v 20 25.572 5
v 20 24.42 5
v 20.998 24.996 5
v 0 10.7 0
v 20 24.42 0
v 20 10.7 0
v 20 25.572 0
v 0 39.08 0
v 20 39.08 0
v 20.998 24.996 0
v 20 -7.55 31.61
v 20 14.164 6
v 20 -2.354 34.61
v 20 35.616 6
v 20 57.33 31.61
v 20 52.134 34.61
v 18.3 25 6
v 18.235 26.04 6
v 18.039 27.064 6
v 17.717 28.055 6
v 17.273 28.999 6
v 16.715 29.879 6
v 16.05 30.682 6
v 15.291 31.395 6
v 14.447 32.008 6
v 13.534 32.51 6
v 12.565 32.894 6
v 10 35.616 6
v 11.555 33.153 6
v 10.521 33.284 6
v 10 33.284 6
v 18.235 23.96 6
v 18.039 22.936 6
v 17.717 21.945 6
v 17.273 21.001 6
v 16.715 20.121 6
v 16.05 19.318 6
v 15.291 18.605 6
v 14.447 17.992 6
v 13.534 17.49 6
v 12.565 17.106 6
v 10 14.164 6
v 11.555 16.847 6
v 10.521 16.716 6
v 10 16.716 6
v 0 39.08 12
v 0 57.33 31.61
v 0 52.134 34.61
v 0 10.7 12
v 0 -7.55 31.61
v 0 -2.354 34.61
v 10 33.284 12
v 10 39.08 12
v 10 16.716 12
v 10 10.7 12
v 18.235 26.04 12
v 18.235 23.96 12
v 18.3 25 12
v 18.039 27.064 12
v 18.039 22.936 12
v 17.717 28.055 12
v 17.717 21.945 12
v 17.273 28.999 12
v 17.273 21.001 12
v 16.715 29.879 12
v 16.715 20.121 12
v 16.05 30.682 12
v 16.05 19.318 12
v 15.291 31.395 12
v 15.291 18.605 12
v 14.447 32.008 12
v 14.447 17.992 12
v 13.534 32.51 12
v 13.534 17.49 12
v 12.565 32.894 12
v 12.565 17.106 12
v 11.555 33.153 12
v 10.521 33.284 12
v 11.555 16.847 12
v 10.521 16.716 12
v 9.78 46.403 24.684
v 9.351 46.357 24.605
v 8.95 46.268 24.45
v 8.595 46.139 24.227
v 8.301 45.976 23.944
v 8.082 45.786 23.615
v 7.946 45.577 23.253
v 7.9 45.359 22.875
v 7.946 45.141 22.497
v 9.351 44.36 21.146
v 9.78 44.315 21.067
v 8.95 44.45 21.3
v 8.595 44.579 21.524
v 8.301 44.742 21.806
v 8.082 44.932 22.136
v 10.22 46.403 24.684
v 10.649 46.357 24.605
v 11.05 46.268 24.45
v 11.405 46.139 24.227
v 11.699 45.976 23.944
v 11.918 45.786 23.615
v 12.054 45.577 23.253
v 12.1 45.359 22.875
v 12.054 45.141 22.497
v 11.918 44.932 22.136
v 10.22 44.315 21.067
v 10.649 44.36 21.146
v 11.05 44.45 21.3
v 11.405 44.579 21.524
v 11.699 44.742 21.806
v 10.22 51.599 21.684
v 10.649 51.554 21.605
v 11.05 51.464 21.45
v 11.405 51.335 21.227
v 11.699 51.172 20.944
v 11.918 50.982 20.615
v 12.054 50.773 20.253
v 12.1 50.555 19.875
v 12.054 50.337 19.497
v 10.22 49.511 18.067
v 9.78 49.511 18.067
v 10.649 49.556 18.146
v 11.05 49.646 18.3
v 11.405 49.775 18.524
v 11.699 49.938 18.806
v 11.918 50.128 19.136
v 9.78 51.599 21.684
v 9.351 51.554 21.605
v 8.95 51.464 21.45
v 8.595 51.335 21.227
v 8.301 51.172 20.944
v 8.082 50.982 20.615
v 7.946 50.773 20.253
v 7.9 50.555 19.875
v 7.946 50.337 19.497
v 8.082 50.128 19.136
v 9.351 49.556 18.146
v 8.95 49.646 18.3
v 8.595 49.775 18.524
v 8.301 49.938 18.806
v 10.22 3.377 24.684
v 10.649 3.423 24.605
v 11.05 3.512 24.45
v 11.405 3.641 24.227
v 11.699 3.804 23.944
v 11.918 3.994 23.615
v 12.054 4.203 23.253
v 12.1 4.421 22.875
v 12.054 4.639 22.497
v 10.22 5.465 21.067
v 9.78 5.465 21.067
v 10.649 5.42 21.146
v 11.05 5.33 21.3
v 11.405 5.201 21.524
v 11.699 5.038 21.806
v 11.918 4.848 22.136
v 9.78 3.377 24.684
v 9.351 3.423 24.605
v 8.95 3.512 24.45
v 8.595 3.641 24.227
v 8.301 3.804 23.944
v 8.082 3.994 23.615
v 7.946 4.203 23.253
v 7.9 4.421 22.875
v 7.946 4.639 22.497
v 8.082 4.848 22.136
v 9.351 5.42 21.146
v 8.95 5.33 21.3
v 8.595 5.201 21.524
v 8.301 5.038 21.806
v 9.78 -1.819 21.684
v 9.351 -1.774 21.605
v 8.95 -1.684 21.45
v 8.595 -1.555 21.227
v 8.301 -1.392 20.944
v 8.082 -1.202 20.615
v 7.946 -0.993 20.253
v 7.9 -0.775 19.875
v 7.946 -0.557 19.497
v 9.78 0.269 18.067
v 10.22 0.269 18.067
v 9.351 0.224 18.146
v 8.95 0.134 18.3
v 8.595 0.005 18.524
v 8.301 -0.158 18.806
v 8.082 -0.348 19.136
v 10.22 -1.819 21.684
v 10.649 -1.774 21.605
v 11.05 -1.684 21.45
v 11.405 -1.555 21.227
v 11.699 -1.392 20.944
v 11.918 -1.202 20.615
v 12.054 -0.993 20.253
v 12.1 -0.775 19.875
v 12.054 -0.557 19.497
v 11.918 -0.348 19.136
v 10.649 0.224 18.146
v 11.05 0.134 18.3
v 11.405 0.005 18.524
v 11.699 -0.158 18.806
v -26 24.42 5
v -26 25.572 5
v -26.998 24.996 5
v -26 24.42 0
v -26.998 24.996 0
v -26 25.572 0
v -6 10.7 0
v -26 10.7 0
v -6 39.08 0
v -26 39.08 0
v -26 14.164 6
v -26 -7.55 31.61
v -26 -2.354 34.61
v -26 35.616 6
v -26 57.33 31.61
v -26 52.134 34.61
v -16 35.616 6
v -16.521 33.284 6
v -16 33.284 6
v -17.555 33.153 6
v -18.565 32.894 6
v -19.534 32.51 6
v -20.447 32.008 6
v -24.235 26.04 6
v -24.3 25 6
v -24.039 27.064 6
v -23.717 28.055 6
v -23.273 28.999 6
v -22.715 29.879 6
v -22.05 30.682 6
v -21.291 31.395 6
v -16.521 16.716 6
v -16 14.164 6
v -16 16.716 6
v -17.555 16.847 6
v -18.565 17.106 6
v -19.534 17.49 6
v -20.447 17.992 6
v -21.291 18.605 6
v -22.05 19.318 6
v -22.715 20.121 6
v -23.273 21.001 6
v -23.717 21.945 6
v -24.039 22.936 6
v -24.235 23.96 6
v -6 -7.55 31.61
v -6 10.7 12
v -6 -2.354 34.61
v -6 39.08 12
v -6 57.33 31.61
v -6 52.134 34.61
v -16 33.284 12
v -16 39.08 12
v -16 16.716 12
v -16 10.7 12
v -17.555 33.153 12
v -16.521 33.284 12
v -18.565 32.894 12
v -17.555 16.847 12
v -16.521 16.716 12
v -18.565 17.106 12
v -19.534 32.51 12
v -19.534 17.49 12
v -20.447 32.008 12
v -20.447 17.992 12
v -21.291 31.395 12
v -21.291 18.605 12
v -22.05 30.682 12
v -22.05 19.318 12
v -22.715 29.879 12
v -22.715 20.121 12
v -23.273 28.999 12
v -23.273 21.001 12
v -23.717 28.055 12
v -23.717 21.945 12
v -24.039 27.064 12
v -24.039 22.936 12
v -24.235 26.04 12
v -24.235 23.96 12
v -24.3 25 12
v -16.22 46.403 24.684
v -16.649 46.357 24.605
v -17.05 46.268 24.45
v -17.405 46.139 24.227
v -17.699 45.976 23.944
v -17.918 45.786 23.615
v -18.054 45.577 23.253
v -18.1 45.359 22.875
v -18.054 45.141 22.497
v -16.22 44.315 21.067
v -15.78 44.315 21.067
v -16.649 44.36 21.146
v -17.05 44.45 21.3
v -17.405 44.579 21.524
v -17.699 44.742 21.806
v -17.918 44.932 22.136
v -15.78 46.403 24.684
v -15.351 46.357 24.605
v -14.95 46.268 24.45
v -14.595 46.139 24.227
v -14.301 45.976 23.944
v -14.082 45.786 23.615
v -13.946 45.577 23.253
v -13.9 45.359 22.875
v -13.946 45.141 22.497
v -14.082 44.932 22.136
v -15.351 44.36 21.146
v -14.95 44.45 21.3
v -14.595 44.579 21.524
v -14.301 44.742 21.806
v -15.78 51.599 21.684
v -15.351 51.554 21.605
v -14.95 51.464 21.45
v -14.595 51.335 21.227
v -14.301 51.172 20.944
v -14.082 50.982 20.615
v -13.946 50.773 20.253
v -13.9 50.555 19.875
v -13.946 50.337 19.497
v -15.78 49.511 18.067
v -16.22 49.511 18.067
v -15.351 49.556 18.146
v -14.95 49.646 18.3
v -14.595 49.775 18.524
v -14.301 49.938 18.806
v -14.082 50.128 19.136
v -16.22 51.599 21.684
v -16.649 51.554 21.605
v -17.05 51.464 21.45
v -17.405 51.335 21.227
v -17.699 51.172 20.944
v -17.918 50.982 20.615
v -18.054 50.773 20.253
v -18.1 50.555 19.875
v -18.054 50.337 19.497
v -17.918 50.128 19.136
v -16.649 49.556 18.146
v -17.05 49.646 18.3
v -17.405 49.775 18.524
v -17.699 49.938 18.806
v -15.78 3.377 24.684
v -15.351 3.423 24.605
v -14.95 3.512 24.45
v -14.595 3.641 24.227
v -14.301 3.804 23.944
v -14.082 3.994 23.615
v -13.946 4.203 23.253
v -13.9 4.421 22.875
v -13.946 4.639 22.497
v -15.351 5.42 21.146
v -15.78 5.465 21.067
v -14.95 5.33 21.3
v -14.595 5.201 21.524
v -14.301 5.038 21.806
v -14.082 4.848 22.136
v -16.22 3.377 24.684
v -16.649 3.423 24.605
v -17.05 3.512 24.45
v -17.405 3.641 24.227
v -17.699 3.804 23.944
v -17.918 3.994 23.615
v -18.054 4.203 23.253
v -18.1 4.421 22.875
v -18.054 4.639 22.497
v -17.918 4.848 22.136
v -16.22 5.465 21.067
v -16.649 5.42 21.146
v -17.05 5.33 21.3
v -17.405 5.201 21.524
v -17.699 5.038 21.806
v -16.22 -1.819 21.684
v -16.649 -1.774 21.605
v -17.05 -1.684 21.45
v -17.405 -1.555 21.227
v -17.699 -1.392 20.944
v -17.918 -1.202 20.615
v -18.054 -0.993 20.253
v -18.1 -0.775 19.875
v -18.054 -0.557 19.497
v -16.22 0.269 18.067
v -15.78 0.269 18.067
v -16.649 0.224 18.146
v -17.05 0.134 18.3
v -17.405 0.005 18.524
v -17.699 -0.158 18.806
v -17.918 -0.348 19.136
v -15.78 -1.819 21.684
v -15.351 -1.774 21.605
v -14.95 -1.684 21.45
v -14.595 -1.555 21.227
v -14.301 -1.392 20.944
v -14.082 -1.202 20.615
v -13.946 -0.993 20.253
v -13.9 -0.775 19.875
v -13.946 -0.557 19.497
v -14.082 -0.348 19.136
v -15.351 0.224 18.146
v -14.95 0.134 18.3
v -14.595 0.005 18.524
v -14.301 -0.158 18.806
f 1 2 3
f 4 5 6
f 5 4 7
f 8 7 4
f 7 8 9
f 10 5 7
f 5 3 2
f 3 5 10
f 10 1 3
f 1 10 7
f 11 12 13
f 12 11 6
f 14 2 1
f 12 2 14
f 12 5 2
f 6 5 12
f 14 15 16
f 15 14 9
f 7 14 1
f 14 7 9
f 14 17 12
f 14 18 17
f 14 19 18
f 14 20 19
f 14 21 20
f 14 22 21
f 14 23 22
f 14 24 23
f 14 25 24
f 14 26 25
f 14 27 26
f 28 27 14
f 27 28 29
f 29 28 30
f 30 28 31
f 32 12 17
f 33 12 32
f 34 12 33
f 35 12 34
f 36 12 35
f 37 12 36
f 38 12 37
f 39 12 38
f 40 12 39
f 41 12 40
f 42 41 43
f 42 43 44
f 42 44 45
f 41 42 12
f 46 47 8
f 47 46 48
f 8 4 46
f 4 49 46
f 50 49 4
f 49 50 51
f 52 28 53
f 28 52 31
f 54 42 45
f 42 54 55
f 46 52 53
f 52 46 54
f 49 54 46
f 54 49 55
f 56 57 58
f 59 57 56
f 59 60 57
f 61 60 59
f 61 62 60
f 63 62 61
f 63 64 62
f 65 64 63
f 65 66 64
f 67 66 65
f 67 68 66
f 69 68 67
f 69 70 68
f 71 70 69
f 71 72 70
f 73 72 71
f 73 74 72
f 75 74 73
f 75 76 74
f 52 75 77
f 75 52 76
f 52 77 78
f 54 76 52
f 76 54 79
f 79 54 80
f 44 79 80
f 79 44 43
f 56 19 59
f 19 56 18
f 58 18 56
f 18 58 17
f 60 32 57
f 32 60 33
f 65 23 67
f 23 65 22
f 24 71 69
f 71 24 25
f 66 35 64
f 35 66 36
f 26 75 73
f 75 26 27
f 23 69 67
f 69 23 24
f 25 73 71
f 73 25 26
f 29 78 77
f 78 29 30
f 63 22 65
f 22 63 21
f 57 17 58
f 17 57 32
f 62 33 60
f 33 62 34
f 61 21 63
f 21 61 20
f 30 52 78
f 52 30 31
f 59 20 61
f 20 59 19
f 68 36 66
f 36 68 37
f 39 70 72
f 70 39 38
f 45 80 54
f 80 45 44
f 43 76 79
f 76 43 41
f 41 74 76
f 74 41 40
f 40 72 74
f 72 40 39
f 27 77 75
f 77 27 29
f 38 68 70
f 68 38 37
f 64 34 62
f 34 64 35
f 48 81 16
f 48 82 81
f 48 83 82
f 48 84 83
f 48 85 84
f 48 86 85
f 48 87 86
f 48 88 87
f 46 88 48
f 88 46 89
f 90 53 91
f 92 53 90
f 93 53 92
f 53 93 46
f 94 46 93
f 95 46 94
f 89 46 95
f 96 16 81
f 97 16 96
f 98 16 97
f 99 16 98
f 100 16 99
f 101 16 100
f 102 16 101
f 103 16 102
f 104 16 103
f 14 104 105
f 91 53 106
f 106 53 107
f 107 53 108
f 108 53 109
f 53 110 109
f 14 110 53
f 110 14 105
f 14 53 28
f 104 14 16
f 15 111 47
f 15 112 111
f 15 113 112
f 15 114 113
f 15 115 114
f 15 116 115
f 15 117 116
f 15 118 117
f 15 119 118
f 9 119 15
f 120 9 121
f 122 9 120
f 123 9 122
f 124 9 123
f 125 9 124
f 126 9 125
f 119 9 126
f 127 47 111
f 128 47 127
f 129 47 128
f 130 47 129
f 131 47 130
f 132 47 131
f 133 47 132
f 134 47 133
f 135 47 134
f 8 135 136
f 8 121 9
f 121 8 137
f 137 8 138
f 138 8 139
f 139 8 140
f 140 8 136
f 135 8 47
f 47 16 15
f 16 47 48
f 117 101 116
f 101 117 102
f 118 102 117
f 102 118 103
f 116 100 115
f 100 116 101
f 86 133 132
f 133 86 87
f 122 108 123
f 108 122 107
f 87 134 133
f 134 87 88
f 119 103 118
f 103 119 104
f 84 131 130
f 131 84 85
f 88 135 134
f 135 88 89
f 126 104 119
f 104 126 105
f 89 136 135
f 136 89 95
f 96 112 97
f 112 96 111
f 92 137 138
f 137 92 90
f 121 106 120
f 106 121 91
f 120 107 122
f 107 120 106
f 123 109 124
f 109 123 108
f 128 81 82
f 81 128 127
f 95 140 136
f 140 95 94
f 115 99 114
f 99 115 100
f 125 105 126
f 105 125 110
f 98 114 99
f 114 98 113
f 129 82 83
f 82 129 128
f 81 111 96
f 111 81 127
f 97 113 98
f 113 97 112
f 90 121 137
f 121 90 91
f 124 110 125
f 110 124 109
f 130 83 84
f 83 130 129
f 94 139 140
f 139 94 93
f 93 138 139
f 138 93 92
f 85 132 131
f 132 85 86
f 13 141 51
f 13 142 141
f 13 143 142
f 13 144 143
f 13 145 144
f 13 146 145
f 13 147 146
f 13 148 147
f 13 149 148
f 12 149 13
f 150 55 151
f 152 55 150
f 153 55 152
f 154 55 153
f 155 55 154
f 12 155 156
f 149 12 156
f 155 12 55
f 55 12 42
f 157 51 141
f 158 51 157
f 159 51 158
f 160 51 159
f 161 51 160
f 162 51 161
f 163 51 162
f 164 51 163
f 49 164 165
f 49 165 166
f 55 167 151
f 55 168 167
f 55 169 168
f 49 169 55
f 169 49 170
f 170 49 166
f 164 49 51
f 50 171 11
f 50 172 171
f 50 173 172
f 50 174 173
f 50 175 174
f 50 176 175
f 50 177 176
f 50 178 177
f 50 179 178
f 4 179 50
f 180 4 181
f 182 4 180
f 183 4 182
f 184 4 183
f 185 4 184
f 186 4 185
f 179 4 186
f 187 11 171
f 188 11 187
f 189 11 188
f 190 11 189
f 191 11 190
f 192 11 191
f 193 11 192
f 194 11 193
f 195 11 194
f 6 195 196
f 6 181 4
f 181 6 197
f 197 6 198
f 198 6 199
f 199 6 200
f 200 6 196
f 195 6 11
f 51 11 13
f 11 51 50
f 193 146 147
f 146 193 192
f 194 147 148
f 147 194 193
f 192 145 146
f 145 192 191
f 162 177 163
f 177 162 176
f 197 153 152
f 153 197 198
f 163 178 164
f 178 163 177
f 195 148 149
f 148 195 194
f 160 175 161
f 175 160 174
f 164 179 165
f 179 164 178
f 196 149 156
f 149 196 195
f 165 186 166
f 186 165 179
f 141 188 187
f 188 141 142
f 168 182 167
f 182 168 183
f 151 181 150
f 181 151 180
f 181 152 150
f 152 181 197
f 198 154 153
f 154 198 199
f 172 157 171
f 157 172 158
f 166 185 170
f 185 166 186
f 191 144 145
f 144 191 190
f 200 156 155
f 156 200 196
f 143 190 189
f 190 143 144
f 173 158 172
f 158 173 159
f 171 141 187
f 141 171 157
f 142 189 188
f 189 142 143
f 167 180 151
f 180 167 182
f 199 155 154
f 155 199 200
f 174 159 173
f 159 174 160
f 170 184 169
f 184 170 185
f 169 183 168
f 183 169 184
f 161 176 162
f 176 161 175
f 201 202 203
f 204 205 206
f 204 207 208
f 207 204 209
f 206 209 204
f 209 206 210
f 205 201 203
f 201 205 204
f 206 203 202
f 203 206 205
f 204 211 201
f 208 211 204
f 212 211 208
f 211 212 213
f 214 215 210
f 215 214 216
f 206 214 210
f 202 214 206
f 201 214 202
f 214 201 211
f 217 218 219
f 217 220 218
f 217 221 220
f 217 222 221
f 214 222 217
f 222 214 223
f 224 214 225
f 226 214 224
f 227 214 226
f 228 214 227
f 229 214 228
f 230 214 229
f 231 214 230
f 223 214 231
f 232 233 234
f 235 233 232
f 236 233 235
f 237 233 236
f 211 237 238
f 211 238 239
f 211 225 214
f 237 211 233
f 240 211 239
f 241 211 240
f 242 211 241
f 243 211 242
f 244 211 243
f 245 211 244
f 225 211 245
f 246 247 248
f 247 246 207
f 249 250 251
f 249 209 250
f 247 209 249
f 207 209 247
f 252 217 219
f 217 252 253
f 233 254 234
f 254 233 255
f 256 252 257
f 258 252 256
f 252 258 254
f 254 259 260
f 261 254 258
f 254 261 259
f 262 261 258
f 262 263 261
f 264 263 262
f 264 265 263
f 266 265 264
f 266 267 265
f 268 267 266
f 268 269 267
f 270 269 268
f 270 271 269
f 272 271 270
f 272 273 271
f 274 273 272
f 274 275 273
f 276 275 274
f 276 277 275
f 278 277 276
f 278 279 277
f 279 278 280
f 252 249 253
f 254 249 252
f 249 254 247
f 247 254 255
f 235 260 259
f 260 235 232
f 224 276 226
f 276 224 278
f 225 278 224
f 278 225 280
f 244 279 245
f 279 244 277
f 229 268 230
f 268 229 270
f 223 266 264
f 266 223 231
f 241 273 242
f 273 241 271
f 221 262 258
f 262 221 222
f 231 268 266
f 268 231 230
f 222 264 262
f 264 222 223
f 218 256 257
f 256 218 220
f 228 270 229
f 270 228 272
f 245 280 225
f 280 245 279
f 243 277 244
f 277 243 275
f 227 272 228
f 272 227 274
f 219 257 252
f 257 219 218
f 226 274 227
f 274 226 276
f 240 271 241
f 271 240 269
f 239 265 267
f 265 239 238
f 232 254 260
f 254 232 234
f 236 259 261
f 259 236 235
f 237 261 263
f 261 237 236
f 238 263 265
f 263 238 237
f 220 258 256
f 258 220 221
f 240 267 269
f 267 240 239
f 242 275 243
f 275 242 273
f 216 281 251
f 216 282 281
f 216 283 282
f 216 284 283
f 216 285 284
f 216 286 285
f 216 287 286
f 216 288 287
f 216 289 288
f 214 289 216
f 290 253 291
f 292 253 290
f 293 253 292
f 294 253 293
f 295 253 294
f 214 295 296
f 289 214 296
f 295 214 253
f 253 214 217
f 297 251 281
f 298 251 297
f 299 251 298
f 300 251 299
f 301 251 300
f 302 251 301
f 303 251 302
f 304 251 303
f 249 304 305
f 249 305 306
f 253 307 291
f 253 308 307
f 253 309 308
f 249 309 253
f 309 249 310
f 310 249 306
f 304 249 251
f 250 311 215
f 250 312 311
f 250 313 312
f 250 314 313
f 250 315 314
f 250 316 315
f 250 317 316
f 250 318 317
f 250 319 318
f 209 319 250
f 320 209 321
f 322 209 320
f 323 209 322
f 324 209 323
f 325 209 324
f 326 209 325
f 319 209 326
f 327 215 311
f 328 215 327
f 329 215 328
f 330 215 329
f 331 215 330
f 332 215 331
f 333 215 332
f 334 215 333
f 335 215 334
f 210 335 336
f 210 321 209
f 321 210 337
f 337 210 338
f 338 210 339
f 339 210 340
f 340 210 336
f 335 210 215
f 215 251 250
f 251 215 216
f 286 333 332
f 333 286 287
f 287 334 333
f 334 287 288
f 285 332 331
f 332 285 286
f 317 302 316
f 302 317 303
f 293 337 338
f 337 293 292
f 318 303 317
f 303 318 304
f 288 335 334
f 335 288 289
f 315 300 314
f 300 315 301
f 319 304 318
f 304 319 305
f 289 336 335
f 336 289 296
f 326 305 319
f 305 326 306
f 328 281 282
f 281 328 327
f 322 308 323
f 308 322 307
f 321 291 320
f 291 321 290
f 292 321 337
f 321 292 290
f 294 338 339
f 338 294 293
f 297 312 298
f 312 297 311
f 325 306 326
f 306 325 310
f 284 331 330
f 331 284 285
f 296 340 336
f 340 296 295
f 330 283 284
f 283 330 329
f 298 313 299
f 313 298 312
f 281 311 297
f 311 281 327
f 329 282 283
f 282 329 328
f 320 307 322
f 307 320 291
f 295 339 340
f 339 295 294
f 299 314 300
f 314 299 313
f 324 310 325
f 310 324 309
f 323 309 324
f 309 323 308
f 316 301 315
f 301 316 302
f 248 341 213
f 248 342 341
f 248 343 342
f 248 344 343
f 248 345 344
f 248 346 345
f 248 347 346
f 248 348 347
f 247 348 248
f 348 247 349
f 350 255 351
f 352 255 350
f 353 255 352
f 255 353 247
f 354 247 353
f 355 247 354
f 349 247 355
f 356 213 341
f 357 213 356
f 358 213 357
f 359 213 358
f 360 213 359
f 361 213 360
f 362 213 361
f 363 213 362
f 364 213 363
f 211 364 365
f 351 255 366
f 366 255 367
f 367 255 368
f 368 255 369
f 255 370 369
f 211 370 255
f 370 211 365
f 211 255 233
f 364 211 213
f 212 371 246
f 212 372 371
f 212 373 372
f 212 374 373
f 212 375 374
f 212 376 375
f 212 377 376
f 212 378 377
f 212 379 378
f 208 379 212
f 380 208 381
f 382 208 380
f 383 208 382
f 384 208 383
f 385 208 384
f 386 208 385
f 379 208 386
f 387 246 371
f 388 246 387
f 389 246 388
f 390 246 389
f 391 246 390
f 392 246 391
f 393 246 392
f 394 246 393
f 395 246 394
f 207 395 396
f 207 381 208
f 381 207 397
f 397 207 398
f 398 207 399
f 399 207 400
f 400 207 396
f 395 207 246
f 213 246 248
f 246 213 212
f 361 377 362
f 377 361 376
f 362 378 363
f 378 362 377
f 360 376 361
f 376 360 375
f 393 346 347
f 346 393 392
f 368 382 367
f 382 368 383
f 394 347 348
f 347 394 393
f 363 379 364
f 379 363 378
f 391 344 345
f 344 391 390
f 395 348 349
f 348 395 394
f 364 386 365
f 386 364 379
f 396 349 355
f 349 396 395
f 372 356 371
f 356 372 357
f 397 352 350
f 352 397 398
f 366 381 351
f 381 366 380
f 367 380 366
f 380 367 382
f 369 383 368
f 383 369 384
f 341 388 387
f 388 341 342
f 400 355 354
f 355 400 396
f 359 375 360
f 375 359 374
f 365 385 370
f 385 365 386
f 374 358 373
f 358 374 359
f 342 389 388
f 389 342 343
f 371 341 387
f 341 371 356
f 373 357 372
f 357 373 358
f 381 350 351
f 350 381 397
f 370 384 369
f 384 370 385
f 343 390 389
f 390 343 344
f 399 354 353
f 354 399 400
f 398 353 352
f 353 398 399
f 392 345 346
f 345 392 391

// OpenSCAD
// file: functions.scad
// PRUSA Mendel  
// Functions used in many files
// GNU GPL v2
// Josef Průša
// josefprusa@me.com
// prusadjs.cz
// http://www.reprap.org/wiki/Prusa_Mendel
// http://github.com/prusajr/PrusaMendel

module nut(d,h,horizontal=true){
cornerdiameter =  (d / 2) / cos (180 / 6);
cylinder(h = h, r = cornerdiameter, $fn = 6);
if(horizontal){
for(i = [1:6]){
	rotate([0,0,60*i]) translate([-cornerdiameter-0.2,0,0]) rotate([0,0,-45]) cube(size = [2,2,h]);
}}
}

// By nophead
module polyhole(d,h) {
    n = max(round(2 * d),3);
    rotate([0,0,180])
        cylinder(h = h, r = (d / 2) / cos (180 / n), $fn = n);
}

module roundcorner(diameter){
	difference(){
		cube(size = [diameter,diameter,99], center = false);
		translate(v = [diameter, diameter, 0]) cylinder(h = 100, r=diameter, center=true);
	}
}
// file: metric.scad
// PRUSA Mendel  
// Default metric sizes
// GNU GPL v2
// Josef Průša
// josefprusa@me.com
// prusadjs.cz
// http://www.reprap.org/wiki/Prusa_Mendel
// http://github.com/prusajr/PrusaMendel

// DONT CHANGE THIS FILE! ALTER VALUES IN CONFIGURATION.SCAD INSTEAD

// RODS

threaded_rod_diameter = 8;
threaded_rod_diameter_horizontal = 8;
smooth_bar_diameter = 8;
smooth_bar_diameter_horizontal = 8;

// Nuts and bolts

m8_diameter = 8;
m8_nut_diameter = 14.5;

m4_diameter = 4;
m4_nut_diameter = 7.5;

m3_diameter = 3;
m3_nut_diameter = 5;

// Bushing holder

bushing_core_diameter = smooth_bar_diameter;
bushing_material_thickness = 1;

// Motors

motor_shaft = 5.1;
// file: configuration.scad
// PRUSA Mendel  
// Configuration file
// GNU GPL v2
// Josef Průša
// josefprusa@me.com
// prusadjs.cz
// http://www.reprap.org/wiki/Prusa_Mendel
// http://github.com/prusajr/PrusaMendel

// PLEASE SELECT ONE OF THE CONFIGURATIONS BELOW
// BY UN-COMMENTING IT

// Uncomment for metric settings
// METRIC METRIC METRIC METRIC METRIC METRIC METRIC METRIC 

include <metric.scad>;

// Uncomment for imperial settings
// IMPERIAL IMPERIAL IMPERIAL IMPERIAL IMPERIAL IMPERIAL IMPERIAL 

//include <sae.scad>;

//thin_wall = 3;
// LM8UU
//linear = false;

// override settings by customizing below
// CUSTOM CUSTOM CUSTOM CUSTOM CUSTOM CUSTOM CUSTOM CUSTOM CUSTOM

threaded_rod_diameter = 8.2;
threaded_rod_diameter_horizontal = 8.2;
smooth_bar_diameter = 8.3;
smooth_bar_diameter_horizontal = 8.3;

// Nuts and bolts

m8_diameter = 8.3;
m8_nut_diameter = 15;

m4_diameter = 4.2;
m4_nut_diameter = 9;

m3_diameter = 3.3;
m3_nut_diameter = 5.8;

///counted stuff
m3_nut_diameter_bigger = ((m3_nut_diameter  / 2) / cos (180 / 6))*2;

// functions 
include <functions.scad>
// main file
// C. Strang		
// cstrang@????
// funfor.us
// f. beachler
// longevity software d.b.a. terawatt industries
// OPTIONAL for PrismX - experimental - does not work with hotextrusion version

include <configuration.scad>;

m3=m3_diameter;
m3n=m3_nut_diameter;
m4=m4_diameter ; 

h = 6;       	// base thickness
mh = h-1;			// marker height
o = 0.1;			//  overlap amount
hh = 6;				// bar holder height
m=m4_diameter;	// attachment hole diameter;
st=-1;				// slot depth 2=normal, -1 = none
rh=smooth_bar_diameter_horizontal;

$fn=30;

translate([0,0,0]) ztopholder(m,h,hh,st,mh,rh);
translate([-6,0,0]) mirror() ztopholder(m,h,hh,st,mh,rh);

module ztopholder(ztm,zth,zthh,ztst,ztmh,ztrh)
{
	difference()
	{
		union()
		{
			translate([0,10.7,0]) cube([20,28.38,zth]);
			translate([20-o,24.4,0]) marker(ztmh);
			//rod holder frame
			translate([0,10.7,zth-o]) rotate([0,0,0]) cube([10,28.38,zthh+o]);
			translate([10,25,zth-o]) cylinder(r=(ztrh),h=zthh+o,$fn=50);

			//translate([0,25,zth-o]) rodholder(zthh);
		}
	}
	translate([0,39.08,0]) rotate([60,0,0]) slantbase(zthh,ztst,ztm);
	translate([0,10.7,0]) mirror([0,1,0]) rotate([60,0,0]) slantbase(zthh,ztst,ztm);
}

module marker(mmh)
{
	difference()
	{
		cube([1.1,1.2,mmh]);
		translate([1,-1.77,-o]) rotate([0,0,30]) cube([2,2,mmh+2*o]);
		translate([0,1.23,-o]) rotate([0,0,-30]) cube([2,2,mmh+2*o]);
	}
}

module slantbase(sbhh,sbst,sbm)
{
	difference()
	{
		translate([0,0,0]) rotate([0,0,0]) cube([20,21.5 + 15,sbhh]);
		translate([10,15.45 + 15 / 2,-o]) rotate([0,0,0]) cylinder(r=sbm/2,h=sbhh+2*o);
	}
	difference()
	{
		translate([7.5,0,-sbst]) cube([5,11,sbst+o]);
		translate([7.4,-2.42,0]) rotate([-60,0,0]) cube([5.2,11,sbst+o]);
	}



}
